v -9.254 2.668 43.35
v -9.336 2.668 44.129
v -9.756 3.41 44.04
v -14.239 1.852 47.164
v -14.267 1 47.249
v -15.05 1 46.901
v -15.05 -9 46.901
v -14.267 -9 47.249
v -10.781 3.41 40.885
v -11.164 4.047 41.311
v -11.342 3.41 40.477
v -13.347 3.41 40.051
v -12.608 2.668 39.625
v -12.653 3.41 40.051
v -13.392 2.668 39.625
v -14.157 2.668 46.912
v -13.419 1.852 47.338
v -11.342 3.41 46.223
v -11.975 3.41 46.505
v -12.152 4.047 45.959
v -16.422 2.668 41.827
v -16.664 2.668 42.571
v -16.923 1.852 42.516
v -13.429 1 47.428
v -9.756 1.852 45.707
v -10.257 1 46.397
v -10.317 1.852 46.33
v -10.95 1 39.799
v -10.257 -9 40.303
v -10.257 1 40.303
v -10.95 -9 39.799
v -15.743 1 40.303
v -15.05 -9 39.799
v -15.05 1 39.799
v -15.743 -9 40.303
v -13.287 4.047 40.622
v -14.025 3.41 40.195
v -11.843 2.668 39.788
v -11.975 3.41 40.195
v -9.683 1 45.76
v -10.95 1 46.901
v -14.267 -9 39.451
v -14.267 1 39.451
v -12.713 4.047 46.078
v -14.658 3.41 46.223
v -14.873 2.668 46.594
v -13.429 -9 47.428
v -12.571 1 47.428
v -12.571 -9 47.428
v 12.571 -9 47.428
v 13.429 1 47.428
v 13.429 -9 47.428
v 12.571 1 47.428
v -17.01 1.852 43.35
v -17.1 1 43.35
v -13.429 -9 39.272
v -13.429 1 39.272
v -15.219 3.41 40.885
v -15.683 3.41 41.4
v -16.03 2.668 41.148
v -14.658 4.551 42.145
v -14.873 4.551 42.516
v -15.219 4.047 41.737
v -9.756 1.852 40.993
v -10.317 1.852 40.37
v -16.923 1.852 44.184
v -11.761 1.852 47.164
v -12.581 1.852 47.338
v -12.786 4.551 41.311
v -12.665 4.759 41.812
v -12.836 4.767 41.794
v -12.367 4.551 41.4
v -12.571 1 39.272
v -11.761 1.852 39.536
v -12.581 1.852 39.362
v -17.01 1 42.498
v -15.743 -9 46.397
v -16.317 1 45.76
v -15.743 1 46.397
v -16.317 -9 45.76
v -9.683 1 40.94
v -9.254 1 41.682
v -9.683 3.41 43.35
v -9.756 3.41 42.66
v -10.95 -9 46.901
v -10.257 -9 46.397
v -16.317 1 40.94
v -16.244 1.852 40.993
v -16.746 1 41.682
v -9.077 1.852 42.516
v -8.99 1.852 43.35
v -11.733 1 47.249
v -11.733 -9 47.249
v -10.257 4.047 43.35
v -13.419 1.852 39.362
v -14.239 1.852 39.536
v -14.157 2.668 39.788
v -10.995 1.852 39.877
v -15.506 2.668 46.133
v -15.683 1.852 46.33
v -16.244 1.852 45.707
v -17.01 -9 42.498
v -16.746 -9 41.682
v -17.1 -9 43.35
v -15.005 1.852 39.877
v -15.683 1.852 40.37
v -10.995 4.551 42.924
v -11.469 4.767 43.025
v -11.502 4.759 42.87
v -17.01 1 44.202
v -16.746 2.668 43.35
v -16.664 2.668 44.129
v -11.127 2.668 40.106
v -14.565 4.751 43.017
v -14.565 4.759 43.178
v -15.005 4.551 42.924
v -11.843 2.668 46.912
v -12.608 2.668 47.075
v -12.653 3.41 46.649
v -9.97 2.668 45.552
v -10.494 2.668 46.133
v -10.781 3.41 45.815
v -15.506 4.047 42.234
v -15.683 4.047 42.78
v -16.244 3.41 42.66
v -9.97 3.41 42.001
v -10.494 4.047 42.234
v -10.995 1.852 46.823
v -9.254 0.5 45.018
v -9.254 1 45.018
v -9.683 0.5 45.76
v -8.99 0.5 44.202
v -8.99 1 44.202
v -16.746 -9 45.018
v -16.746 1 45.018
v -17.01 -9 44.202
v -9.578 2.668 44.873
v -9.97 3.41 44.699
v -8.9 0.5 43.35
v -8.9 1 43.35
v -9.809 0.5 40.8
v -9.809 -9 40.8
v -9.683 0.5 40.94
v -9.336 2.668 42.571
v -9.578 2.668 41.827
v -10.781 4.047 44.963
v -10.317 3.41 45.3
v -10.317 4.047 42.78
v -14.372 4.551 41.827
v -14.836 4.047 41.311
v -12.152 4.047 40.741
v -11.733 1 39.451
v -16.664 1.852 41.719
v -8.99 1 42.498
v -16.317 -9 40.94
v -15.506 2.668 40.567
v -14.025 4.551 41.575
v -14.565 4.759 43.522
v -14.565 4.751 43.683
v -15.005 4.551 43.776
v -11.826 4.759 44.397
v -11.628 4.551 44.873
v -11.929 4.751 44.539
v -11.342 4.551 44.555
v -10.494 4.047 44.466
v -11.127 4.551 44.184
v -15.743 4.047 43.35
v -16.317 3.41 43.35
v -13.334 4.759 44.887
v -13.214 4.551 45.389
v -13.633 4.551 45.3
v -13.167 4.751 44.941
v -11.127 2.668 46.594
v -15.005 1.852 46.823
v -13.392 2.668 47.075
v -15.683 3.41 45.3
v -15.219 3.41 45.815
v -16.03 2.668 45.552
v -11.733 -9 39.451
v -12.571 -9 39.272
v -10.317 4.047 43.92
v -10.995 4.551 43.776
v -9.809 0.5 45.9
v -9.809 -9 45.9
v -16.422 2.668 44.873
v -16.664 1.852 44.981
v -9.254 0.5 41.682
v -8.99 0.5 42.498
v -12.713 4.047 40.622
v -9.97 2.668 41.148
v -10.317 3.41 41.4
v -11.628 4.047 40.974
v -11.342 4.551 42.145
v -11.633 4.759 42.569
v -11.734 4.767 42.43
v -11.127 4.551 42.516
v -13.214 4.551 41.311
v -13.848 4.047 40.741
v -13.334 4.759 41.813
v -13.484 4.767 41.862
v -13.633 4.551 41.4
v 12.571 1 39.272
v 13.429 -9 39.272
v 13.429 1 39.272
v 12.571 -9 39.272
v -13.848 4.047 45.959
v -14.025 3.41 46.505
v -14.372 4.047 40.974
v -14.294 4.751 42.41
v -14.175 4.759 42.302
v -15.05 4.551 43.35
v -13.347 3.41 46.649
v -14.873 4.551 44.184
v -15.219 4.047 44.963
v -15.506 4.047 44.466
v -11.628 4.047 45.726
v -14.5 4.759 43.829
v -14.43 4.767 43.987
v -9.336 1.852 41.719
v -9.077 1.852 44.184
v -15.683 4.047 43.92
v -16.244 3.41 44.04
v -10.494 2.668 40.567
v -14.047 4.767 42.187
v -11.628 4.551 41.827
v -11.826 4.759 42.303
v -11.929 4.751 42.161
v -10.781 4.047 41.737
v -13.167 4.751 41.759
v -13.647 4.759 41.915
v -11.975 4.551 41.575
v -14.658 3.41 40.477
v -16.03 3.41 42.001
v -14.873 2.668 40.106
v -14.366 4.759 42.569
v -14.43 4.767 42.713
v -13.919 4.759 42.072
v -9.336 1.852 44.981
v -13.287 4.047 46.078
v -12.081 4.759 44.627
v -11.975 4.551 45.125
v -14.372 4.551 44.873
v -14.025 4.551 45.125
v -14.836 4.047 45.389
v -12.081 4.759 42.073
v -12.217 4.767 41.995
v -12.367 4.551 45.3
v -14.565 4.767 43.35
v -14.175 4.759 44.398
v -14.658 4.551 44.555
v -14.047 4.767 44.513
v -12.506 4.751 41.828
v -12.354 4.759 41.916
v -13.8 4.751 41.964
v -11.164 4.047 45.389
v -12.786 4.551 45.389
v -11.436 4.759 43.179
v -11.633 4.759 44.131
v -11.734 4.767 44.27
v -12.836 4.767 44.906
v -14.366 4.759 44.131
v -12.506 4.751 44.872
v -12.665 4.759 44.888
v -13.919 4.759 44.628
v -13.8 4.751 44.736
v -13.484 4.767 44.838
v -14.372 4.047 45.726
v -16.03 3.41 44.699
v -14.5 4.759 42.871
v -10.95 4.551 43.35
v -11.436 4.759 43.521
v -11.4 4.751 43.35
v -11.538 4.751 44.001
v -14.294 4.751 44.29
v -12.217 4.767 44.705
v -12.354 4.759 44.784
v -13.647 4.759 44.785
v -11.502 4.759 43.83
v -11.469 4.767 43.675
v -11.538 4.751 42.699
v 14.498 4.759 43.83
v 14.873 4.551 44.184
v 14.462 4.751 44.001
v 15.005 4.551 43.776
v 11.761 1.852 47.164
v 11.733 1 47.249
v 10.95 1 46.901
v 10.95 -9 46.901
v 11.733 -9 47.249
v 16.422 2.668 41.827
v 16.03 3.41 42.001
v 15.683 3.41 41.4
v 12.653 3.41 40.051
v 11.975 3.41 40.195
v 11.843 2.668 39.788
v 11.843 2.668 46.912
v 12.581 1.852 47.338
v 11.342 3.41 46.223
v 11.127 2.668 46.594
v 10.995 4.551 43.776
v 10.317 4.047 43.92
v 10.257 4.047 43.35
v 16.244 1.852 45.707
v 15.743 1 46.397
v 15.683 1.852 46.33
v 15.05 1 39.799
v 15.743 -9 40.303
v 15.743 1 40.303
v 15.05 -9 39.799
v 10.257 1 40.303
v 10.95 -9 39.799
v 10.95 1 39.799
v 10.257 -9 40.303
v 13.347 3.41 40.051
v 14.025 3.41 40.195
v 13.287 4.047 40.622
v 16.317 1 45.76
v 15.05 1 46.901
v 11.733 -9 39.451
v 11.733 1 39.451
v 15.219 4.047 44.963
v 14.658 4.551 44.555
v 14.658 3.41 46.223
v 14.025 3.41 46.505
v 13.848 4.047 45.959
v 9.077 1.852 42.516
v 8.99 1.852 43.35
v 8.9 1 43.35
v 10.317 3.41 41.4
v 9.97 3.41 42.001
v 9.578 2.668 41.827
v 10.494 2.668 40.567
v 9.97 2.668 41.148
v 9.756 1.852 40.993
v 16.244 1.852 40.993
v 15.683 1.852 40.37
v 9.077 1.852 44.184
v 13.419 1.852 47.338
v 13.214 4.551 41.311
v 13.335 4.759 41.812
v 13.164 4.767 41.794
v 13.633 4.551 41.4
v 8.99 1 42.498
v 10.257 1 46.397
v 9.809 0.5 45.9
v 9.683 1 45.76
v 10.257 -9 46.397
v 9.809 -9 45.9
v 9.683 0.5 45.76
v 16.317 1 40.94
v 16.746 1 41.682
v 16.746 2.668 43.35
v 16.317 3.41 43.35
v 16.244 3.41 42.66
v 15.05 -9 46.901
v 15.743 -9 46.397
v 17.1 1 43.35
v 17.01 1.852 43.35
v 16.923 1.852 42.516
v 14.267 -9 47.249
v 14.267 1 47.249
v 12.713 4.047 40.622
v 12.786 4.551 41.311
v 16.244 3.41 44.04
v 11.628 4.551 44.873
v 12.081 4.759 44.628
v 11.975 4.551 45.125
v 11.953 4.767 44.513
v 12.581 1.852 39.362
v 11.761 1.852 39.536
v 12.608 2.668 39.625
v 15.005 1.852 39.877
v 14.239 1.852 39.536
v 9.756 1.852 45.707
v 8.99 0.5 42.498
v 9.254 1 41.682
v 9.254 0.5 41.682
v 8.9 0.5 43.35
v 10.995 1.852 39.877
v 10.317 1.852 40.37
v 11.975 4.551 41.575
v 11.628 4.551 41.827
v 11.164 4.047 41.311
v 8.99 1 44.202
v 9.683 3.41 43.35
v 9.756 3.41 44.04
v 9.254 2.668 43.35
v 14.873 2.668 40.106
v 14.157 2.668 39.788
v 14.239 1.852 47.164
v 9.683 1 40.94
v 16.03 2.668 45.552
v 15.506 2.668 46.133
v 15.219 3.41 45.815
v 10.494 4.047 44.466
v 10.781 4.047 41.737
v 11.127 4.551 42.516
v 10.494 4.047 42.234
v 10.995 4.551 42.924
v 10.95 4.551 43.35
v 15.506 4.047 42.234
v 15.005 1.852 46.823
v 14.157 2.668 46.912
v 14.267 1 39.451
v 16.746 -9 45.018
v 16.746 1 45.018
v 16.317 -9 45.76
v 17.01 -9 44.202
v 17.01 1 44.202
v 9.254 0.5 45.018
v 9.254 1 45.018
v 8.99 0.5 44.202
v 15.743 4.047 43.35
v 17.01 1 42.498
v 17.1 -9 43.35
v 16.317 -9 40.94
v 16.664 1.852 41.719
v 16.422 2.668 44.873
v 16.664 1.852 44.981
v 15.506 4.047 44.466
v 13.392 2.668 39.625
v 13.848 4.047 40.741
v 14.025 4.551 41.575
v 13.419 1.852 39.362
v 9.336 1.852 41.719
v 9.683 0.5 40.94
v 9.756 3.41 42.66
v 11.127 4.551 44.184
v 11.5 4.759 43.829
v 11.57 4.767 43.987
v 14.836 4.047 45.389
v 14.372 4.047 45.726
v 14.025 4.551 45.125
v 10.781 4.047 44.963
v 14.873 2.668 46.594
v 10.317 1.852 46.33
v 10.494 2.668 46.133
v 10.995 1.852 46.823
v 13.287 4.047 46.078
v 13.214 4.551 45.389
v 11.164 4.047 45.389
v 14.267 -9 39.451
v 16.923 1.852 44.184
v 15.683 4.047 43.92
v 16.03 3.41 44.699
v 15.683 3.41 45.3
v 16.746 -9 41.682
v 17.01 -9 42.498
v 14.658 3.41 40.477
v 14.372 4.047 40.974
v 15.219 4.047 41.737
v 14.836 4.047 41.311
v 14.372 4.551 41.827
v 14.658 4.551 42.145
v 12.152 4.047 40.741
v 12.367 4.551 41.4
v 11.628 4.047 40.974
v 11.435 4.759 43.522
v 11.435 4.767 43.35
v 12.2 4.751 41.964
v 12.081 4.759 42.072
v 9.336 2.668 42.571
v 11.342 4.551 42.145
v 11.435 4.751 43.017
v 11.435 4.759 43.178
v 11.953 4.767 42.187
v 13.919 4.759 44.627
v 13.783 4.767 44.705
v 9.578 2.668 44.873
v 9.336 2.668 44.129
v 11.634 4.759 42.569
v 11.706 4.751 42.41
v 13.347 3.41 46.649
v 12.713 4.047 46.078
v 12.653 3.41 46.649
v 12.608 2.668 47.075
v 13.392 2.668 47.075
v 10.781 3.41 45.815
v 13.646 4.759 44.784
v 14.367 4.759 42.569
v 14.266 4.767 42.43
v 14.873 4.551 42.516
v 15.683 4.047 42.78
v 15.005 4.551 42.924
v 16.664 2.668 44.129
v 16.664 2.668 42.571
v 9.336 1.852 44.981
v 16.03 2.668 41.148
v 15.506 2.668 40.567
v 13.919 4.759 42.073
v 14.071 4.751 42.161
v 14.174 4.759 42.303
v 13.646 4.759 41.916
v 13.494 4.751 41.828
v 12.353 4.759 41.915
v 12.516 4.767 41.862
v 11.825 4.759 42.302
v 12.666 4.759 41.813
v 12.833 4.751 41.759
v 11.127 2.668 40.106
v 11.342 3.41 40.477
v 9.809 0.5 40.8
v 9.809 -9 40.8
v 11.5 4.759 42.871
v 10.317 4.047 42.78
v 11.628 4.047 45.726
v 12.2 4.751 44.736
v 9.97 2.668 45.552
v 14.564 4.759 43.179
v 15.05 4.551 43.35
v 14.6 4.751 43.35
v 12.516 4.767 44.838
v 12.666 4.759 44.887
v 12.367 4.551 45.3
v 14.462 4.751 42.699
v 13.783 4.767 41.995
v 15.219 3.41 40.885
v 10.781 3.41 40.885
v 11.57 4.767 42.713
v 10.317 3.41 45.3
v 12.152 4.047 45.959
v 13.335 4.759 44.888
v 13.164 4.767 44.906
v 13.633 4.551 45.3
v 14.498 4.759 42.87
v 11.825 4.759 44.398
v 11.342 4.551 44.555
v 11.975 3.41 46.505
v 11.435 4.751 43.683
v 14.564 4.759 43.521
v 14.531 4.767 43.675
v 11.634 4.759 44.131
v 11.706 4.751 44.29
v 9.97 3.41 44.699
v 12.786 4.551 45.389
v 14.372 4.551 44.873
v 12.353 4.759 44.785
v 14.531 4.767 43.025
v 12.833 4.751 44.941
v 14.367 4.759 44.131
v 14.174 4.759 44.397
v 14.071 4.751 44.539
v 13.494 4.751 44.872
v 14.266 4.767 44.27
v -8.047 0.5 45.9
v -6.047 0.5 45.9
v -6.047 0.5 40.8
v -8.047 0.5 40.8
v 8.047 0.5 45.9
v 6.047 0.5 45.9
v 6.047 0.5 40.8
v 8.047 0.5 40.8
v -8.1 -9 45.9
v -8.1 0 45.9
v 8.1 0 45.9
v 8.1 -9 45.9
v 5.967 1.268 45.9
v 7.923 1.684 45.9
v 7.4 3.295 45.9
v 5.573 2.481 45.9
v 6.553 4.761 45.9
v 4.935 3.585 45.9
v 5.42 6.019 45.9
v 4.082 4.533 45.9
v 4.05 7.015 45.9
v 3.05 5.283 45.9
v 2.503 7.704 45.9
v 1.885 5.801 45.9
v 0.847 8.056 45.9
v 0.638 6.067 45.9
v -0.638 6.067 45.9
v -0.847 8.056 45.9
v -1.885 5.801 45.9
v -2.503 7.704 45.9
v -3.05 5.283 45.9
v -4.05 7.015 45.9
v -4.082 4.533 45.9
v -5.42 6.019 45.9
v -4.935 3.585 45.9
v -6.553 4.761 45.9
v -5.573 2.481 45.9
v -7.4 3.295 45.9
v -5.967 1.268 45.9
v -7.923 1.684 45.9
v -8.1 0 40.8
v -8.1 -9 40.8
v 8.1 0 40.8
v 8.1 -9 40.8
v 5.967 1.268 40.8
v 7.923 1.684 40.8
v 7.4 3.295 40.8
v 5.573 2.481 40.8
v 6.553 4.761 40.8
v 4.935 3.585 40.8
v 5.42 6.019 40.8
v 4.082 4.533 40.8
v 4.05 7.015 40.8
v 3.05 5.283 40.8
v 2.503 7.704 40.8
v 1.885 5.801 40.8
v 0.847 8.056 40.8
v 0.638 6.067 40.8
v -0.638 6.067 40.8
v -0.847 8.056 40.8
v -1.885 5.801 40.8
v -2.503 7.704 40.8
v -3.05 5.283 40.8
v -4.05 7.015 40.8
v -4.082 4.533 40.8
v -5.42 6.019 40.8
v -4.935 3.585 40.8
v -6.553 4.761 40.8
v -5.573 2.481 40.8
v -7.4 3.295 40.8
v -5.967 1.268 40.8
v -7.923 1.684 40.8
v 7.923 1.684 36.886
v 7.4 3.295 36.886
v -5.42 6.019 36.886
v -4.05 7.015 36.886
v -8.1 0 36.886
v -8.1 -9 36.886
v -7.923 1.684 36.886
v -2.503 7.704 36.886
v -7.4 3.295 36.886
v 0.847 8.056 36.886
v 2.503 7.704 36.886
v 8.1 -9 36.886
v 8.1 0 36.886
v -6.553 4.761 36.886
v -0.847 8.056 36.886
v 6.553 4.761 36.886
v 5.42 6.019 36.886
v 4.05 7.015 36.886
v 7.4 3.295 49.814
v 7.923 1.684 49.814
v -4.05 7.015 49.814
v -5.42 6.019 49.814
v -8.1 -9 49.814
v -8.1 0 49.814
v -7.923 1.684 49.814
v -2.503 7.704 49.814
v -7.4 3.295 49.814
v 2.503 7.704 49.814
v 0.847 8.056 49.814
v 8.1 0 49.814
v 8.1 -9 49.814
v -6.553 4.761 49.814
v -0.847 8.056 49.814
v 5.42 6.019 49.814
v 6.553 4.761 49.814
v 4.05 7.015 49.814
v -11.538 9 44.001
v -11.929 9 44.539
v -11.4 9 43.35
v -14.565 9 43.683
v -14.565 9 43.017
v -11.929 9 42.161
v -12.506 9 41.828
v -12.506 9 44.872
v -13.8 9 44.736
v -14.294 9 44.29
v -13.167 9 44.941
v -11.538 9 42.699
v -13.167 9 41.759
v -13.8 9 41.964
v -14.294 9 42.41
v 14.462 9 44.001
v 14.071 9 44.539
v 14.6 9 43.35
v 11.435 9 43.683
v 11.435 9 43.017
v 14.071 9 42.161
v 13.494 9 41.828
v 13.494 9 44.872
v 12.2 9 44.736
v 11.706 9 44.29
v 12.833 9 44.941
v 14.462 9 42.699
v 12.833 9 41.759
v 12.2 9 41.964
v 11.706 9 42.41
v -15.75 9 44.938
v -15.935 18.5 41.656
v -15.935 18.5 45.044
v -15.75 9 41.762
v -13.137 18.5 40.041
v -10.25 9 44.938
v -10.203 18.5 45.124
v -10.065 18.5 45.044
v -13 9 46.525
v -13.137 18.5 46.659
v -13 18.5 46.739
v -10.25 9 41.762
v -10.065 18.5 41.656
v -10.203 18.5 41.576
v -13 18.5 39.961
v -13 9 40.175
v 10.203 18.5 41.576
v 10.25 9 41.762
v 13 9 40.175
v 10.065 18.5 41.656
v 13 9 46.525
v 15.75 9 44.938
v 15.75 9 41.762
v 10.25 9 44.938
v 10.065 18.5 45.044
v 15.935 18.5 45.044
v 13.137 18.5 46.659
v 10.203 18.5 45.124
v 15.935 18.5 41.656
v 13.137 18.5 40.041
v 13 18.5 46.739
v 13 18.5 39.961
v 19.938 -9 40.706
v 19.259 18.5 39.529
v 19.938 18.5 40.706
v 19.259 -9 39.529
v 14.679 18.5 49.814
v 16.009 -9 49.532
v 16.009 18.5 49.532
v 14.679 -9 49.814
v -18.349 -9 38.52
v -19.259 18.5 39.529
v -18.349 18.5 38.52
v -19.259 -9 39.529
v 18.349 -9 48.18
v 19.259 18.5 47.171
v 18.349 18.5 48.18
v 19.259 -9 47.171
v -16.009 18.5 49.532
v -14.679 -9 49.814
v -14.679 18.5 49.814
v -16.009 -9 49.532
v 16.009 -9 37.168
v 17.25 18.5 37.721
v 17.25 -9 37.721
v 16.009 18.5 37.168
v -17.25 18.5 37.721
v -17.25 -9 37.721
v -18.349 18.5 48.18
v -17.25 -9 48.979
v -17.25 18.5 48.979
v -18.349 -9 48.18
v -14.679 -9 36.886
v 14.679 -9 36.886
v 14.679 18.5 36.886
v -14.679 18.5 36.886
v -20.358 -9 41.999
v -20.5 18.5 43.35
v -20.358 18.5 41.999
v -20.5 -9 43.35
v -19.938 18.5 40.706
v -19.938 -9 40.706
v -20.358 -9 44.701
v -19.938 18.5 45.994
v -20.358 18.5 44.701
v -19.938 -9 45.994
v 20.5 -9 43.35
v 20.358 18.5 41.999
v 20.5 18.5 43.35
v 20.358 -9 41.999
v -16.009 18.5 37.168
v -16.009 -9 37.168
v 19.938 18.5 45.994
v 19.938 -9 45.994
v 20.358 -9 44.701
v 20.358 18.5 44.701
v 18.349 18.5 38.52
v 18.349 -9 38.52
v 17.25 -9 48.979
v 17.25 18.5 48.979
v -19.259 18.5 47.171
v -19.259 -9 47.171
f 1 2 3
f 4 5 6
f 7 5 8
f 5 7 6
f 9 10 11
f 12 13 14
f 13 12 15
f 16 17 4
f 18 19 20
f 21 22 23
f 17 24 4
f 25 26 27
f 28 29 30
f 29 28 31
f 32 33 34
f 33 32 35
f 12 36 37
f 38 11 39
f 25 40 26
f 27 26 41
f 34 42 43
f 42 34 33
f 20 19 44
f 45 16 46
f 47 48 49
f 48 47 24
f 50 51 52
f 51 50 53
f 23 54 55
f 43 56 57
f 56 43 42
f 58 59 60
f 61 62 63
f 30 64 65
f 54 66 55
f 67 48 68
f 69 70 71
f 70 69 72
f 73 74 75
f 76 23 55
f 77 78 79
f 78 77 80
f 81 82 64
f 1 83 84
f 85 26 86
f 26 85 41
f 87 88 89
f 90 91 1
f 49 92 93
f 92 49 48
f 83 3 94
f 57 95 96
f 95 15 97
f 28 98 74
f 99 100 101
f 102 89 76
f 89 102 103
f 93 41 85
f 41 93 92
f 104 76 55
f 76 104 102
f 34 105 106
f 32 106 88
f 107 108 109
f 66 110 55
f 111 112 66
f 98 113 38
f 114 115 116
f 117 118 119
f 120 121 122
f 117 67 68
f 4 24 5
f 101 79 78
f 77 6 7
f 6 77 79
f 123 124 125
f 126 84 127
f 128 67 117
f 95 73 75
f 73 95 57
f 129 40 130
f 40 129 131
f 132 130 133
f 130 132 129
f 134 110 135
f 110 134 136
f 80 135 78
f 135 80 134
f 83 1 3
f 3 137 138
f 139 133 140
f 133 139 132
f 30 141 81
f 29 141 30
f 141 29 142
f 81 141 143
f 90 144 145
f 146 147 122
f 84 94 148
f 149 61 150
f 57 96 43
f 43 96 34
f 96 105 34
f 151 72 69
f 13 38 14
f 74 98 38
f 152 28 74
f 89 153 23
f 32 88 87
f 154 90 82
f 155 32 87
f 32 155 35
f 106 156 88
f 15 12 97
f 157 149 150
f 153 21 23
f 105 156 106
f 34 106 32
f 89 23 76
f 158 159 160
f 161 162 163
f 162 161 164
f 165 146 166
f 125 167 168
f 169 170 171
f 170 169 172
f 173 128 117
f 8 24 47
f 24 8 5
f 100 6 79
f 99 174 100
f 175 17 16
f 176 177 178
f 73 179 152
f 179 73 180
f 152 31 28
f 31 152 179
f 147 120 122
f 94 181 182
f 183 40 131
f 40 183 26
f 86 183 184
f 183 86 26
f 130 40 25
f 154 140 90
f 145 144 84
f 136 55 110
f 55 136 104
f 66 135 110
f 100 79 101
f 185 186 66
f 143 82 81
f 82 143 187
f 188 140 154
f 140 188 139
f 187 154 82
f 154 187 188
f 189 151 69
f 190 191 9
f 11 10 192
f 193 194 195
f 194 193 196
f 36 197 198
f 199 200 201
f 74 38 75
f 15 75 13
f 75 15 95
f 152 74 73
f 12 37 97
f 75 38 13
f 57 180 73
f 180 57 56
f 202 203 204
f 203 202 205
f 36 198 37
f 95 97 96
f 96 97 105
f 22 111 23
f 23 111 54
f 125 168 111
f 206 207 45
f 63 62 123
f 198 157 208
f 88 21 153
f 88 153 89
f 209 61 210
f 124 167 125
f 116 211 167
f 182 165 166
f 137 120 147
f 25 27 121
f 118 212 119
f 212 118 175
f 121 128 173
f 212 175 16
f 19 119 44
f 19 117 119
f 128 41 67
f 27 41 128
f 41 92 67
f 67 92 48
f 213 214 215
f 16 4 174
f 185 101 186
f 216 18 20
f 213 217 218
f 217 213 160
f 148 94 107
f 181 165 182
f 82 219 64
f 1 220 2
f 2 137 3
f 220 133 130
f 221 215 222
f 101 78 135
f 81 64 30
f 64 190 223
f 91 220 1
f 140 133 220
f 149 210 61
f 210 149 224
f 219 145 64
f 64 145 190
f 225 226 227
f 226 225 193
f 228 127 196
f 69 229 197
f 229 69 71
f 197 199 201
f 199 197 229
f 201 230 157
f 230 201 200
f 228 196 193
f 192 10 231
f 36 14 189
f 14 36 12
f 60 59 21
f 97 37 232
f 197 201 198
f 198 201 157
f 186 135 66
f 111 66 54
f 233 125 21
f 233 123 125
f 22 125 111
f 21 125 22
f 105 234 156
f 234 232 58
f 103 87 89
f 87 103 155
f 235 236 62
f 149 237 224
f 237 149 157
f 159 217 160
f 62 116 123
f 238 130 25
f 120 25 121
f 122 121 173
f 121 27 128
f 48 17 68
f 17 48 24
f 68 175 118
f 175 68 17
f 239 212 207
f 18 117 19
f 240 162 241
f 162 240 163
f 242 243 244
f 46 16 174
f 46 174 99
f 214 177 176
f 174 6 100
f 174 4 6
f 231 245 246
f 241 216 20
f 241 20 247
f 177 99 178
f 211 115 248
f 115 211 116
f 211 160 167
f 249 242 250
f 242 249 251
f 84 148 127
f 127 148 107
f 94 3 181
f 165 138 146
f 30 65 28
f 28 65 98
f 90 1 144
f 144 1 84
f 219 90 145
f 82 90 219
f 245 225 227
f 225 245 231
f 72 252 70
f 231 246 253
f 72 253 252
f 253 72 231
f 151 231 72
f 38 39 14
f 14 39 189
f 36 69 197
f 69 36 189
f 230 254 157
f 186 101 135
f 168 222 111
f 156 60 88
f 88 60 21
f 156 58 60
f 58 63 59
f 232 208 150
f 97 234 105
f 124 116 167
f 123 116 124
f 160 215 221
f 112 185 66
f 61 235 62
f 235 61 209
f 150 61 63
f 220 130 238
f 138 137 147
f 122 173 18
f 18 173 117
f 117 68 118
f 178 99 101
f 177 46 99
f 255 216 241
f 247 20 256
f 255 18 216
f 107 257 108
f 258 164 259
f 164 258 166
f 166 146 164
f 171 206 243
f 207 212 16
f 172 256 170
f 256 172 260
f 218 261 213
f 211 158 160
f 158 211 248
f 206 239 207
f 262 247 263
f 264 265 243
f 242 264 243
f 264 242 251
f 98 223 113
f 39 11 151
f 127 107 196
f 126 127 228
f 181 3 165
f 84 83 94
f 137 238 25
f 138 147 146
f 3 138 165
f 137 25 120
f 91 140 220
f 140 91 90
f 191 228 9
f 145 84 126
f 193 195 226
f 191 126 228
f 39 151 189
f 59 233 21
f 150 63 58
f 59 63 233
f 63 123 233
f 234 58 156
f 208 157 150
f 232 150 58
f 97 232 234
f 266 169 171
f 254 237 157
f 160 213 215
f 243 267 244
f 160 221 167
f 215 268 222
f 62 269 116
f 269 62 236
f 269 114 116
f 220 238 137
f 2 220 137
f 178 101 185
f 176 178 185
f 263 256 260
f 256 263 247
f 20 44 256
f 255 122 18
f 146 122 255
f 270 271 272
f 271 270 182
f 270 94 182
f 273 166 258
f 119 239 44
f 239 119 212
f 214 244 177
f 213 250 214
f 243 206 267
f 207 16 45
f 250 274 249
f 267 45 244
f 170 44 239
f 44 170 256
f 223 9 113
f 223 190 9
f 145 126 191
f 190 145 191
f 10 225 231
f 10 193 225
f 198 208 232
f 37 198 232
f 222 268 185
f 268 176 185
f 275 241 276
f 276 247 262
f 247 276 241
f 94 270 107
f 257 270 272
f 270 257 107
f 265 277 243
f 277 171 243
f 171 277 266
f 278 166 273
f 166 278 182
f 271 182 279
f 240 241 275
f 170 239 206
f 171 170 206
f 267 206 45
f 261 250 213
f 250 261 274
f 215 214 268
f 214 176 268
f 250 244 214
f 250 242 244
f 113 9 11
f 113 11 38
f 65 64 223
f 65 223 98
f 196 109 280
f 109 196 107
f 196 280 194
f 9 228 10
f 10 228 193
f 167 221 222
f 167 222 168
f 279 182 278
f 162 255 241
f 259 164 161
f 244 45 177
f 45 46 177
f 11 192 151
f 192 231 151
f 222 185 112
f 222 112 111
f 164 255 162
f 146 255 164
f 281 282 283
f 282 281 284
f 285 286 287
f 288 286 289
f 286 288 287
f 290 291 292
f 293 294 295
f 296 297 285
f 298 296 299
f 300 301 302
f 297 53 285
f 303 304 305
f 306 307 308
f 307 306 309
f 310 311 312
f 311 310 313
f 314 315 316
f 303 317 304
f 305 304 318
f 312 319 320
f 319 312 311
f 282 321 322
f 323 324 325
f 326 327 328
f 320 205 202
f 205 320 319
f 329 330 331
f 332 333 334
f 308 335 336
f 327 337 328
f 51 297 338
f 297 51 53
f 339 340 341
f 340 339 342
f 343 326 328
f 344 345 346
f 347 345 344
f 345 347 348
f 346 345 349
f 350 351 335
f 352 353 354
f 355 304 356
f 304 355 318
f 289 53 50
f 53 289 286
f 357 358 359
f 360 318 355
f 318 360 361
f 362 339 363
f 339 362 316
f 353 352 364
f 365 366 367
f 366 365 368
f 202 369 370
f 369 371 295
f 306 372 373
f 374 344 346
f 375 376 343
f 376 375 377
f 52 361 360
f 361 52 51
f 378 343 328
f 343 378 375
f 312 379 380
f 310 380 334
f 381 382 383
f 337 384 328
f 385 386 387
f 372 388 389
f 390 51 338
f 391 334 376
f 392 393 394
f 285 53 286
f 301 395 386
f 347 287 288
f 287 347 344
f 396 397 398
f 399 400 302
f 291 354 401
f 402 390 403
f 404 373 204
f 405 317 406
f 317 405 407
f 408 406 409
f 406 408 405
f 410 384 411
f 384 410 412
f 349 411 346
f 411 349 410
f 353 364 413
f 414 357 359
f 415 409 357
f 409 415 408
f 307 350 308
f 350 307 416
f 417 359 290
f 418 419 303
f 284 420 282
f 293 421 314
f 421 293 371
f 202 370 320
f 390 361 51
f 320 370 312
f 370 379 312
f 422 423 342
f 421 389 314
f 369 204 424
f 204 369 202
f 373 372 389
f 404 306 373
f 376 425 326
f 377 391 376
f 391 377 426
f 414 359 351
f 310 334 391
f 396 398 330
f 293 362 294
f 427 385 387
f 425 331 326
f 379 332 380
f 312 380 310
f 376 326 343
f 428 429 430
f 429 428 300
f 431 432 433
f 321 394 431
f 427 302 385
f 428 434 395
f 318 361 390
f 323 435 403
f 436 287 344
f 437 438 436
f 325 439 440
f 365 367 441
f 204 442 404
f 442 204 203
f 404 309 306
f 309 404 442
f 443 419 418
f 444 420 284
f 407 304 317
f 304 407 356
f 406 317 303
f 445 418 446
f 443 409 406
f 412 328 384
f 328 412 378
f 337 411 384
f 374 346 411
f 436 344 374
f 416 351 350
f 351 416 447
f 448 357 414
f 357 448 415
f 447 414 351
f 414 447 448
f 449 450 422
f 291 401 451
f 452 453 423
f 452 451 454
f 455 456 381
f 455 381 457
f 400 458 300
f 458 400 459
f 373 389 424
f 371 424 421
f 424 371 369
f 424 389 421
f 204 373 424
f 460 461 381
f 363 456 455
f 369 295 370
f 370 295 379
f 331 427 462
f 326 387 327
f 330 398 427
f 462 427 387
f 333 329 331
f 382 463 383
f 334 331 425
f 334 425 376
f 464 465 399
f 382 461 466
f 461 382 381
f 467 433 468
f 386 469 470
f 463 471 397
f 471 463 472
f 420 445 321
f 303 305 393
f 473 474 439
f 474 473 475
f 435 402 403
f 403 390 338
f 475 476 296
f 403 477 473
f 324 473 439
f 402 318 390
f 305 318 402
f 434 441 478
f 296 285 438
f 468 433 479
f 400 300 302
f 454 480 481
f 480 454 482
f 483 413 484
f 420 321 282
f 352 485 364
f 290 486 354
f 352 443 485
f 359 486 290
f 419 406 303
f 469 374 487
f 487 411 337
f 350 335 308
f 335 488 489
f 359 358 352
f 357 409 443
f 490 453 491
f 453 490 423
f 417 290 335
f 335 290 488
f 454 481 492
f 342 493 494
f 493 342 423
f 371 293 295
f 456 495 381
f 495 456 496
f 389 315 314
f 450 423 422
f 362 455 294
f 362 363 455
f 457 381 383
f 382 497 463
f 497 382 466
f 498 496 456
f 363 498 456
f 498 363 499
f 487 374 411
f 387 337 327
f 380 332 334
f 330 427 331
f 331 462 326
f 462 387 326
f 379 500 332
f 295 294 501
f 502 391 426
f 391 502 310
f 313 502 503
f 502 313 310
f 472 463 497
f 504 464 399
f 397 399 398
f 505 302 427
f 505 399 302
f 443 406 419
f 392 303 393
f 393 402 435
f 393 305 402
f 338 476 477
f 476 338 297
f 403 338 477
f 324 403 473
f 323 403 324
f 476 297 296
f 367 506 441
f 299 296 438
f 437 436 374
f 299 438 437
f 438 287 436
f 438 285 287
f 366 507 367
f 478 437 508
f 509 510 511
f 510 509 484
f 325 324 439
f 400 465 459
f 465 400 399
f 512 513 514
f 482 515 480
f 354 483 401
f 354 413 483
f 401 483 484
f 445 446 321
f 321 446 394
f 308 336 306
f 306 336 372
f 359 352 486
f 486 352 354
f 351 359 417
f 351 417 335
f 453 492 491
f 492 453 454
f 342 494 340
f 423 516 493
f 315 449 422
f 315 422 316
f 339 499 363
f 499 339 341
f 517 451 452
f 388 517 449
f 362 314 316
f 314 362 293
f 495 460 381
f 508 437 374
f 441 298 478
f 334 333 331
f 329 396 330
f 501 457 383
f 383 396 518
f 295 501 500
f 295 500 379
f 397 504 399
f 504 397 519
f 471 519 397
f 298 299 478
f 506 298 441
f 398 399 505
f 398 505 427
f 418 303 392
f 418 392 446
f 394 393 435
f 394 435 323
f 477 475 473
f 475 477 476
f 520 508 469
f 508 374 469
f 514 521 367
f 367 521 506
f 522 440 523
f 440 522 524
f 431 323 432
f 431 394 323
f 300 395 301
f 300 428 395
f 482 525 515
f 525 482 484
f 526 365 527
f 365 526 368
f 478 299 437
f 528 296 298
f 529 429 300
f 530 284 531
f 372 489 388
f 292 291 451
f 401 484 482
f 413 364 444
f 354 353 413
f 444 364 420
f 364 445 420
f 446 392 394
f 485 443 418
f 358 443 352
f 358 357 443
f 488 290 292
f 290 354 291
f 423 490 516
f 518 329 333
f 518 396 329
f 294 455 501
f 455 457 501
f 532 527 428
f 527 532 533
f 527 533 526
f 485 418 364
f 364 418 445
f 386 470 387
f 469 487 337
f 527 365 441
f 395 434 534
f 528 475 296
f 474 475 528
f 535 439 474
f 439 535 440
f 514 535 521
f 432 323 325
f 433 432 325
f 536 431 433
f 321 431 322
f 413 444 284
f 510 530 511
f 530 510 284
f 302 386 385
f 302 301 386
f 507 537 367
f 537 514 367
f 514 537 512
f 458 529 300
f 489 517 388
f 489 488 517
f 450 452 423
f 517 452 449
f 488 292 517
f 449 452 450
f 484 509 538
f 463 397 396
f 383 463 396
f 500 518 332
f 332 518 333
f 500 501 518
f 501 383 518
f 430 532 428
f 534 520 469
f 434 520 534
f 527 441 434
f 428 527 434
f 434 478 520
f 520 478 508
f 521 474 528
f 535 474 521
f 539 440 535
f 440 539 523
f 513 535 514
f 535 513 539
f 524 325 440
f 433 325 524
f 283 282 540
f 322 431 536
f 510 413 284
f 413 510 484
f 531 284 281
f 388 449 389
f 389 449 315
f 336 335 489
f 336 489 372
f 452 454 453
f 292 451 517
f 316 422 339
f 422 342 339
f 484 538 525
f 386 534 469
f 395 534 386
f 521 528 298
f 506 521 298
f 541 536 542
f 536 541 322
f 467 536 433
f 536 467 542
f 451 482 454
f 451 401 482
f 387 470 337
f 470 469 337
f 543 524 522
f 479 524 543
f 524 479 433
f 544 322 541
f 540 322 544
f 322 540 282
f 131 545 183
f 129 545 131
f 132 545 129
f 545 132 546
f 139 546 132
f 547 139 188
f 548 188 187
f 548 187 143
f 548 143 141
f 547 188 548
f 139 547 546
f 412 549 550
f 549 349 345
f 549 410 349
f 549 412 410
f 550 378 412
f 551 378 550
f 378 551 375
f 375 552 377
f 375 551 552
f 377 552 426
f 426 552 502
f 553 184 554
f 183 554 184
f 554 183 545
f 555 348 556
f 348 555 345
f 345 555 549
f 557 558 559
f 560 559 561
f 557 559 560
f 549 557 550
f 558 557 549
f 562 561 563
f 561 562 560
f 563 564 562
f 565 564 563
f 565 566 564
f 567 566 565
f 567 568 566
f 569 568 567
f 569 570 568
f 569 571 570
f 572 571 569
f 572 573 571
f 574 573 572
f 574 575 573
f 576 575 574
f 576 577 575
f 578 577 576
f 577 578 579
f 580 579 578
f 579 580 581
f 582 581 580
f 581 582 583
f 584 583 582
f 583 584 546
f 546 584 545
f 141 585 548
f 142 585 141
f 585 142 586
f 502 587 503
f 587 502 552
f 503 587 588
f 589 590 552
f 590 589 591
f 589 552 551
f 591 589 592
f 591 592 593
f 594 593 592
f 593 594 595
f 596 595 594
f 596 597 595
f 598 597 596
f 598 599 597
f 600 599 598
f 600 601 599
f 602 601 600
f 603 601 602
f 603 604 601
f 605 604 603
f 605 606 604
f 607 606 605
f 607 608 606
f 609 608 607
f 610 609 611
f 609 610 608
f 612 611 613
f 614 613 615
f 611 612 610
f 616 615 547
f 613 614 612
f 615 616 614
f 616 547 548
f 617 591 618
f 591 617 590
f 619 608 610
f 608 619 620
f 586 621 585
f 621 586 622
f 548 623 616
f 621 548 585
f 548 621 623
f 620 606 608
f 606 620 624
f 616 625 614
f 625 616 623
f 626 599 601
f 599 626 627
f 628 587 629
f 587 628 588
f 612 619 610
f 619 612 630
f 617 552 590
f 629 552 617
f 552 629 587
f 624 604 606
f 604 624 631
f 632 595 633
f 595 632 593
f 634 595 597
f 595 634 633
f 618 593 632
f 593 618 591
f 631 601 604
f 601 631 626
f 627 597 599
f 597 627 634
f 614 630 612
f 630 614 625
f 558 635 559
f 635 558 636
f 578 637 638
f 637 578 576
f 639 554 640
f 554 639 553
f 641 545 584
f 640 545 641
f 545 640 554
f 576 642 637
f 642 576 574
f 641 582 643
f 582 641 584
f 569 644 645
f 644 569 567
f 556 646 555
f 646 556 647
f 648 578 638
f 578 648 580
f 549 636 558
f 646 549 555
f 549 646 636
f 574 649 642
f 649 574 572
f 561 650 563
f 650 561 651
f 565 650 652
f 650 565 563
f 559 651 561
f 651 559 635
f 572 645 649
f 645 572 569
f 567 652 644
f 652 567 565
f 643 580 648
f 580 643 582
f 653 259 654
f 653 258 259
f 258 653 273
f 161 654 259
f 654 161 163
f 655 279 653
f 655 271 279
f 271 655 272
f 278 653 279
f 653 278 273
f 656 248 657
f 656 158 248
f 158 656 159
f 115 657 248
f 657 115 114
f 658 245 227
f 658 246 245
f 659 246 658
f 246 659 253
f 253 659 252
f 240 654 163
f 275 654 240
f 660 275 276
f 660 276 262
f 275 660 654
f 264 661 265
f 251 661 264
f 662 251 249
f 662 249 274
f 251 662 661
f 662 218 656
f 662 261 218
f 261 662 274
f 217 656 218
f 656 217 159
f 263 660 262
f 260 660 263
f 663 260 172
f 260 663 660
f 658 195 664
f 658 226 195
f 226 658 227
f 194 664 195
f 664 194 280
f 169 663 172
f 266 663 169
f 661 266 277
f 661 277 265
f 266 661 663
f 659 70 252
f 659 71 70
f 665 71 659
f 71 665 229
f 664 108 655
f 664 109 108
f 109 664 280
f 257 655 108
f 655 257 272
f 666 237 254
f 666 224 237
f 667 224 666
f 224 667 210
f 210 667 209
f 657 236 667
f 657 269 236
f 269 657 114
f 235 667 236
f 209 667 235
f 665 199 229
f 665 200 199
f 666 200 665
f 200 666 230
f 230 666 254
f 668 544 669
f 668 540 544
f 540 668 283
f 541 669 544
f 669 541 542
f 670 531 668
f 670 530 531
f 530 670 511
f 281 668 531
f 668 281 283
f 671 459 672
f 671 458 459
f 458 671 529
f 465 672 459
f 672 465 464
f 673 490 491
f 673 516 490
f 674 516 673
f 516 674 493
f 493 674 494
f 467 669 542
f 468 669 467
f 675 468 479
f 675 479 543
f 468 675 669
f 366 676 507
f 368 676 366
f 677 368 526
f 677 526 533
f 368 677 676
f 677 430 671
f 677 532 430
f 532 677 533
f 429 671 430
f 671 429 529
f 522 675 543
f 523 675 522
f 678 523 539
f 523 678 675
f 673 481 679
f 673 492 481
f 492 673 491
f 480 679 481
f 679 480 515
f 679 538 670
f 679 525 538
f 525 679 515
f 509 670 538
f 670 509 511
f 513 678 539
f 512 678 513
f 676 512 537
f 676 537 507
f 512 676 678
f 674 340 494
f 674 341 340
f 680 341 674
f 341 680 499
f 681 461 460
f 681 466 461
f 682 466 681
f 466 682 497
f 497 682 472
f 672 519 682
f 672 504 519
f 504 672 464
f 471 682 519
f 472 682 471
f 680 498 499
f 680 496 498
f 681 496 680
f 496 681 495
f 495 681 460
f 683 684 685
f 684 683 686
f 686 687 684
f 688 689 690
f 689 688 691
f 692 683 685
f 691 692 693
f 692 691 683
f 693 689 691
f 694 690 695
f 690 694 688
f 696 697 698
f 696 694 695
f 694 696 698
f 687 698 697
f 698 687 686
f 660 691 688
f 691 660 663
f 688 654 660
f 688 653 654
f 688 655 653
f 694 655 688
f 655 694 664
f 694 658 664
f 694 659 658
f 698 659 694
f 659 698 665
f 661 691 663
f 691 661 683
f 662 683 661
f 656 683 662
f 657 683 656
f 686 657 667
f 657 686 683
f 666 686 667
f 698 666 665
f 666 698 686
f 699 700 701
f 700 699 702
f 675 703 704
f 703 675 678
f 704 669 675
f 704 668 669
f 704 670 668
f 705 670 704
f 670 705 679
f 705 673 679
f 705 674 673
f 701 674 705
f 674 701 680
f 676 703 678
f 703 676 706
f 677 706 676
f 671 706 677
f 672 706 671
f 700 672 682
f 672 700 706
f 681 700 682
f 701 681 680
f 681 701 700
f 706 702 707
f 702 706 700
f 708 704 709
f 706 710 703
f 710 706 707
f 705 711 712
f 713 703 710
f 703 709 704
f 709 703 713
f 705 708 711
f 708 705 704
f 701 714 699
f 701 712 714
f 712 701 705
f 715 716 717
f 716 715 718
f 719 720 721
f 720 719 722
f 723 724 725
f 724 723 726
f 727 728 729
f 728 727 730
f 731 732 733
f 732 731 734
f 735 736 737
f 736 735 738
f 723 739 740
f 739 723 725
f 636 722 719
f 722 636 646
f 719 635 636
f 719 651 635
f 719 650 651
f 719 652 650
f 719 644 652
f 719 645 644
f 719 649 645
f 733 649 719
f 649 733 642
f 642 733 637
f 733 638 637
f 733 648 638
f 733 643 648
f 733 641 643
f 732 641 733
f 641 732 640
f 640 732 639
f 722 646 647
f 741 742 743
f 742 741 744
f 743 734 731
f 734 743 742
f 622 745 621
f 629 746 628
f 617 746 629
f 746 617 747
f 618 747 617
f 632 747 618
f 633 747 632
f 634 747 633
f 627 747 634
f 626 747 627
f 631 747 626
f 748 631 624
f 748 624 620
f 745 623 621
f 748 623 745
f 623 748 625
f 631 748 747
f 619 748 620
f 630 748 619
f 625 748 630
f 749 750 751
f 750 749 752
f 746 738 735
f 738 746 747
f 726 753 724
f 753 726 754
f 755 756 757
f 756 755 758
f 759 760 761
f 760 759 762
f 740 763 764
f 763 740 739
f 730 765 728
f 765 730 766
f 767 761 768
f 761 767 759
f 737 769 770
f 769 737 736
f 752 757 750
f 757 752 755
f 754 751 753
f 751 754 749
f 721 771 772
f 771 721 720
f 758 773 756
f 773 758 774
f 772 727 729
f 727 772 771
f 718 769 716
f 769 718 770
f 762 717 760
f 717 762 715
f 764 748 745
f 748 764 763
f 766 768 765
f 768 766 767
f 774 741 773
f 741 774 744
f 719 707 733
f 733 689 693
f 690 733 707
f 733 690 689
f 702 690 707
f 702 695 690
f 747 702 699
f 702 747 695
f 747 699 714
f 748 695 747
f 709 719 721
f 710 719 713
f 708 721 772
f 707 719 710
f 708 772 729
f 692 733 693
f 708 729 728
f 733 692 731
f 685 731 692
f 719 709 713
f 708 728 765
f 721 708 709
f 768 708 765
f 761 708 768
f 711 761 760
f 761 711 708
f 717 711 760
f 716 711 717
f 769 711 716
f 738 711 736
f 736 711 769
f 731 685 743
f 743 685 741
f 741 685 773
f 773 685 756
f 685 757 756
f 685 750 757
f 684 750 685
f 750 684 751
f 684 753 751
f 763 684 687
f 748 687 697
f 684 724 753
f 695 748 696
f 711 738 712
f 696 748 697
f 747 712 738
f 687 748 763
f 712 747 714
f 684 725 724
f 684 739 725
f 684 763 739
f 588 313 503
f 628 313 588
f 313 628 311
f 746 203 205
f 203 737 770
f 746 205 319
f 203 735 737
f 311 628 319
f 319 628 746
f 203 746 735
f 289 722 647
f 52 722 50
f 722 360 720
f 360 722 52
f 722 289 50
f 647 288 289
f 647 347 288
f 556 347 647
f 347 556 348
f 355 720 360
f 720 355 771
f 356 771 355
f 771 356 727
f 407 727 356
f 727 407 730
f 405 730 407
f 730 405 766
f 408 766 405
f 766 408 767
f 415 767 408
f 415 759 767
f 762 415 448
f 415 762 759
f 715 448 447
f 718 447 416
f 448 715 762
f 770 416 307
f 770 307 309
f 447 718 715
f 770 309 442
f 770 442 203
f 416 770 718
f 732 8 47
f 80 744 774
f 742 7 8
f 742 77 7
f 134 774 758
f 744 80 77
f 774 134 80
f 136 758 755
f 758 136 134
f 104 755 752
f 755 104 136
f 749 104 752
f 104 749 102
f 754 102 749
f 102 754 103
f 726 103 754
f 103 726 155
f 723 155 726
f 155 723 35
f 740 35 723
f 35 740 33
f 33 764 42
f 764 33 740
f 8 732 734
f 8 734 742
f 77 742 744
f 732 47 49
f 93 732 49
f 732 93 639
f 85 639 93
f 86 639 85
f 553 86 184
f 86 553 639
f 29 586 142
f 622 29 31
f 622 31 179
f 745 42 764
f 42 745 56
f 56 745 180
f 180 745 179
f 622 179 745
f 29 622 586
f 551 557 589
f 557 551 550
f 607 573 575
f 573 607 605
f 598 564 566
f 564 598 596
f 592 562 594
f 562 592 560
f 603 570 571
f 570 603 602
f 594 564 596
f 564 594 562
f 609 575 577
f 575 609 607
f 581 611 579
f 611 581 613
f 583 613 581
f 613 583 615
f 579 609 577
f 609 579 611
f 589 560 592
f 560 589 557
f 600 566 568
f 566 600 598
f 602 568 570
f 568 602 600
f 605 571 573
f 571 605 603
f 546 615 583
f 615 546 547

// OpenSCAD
// somewhat large hot-end I happen to have
RES=30;  // higher for production render

Hbody = 50;  // height of aluminum base
Dbody = 25;  // diameter at outside of cooling fins
Gblock = 3.7; // gap from body to top of block
IDmount = 12; // inner diameter of mount groove
ODmount = 16; // outer diameter of mount groove
WtopFlange = 4;
Wmount = 5.3;
WbotFlange = 3;

Hblock=12.1; // height of heat block
Wblock = 16; // width of heat block, heater parallel to W axis
Dblock = 16; // nozzle NOT centered in +-D direction

DsocketHeadM3 = 5.4;
HsocketHeadM3 = 3;

%hotEnd();

%translate([0,20,43.35])
rotate([0,90,-90])  // let face of carriage be y=0
railMGN7H();

//difference() { union() {
translate([0,0,Hbody-WtopFlange-Wmount/2])
%retentionTab();

translate([0,0,Hbody-WtopFlange-Wmount/2])
hotEndMount(false,false);
//} translate([0,0,53]) cube([80,80,20],center=true);}

WmountBrace=14;
module hotEndMount(withBrace=true, carriageBase=true) difference() {
    union() {
        *translate([0,9,0]) rotate([90,0,0]) hull() pairX(WmountBrace) 
            cylinder(r=6.5,h=1,$fn=RES);
        baseLen = carriageBase ? 0 : 8.5;
        translate([0,10+baseLen,0]) rotate([90,0,0]) hull() pairX(WmountBrace) 
            cylinder(r=6.5,h=19+baseLen,$fn=RES);
        if (carriageBase) translate([0,20,0]) hull() {
            pairX(6) pairZ(13) rotate([90,0,0])
                cylinder(r=2,h=1,$fn=RES/2);
            translate([0,-11,0]) pairX(WmountBrace) rotate([90,0,0])
                cylinder(r=6.5,h=1,$fn=RES);
        }
        
        // cut away from this sheath over the hot-end as little
        // as possible, for strength
        if (withBrace) braceSheath();
    }
    
    translate([0,1,0]) retentionTabBase(.1);
    hull() {
        cylinder(d=IDmount+.2,h=Wmount+.2,center=true,$fn=RES);
        translate([0,-20,0]) cube([IDmount+.2,1,Wmount+.2],center=true);
    }

    cylinder(d=IDmount,h=20,center=true,$fn=RES);
    pairZ(Wmount/2-.1 +4/2) hull() {
        cylinder(d=ODmount+.2,h=4,center=true,$fn=RES);
        translate([0,-10,0]) cube([ODmount+.2,1,4],center=true);
    }

    // I think the taps on MGN7 carriage are only about 3mm deep
    //   plan on M2 screw to go only 2mm below face of carriage
    if(withBrace)
    translate([0,20.1,0]) rotate([90,0,0]) pairX(6) pairY(6.5) {
        cylinder(r=1.05,h=20,$fn=RES/3);  // M2 socket head? 8mm
        translate([0,0,8-2]) cylinder(d1=3.8,d2=4.2,h=13.5,$fn=RES/2);
    }
    
    translate([0,18,0]) pairX(13) rotate([90,0,0]) cylinder(r=1.6,h=14,$fn=RES/2);
    translate([0,19,0]) pairX(13) rotate([90,30,0])  // M3 nut hole 
       cylinder(d1=6.8, d2=5.5/cos(30),h=10,$fn=6);
    
    translate([-25,20,-51]) cube([50,16,80]);    // don't overlap carriage
    
    translate([0,0,-11]) {   // clearance from hot end
        translate([0,0,-34])
        cylinder(d=Dbody+6, h=34.1,$fn=RES);
        cylinder(d1=Dbody+6, d2=Dbody-3,h=4,$fn=RES);
    
        // clearance from block
        translate([0,-3,-40]) cube([26,24,16],center=true);
    }
}

module braceSheath() difference() {
    hull() {
        cube([36,18,3.5],center=true);

        difference() {
            translate([0,0,-40])
                cylinder(r=24, h=30, $fn=RES*1.5);

            translate([-25,-28,-51]) cube([50,50,18]);
            translate([-25,20,-60]) cube([50,20,80]);

            // don't interfere with blowers
            hull() {
                translate([-25,-29,-5.4])   cube([50,20,1]);
                translate([-25,-28,-40]) cube([50,50,1]);
                //#translate([0,6,-25]) rotate([0,90,0])
                //    cylinder(r=6,h=60,center=true,$fn=RES/2);
            }
        }            
        
    }

    translate([0,0,-51]) cylinder(d=Dbody+12, h=44.55, $fn=RES*1.5);

    
}

module retentionTabBase(fuzz=0) {
    difference() {
        union() {
            hull() {
                translate([0,-5.5,0])
                    cube([ODmount+fuzz-.1,ODmount/2+2,Wmount+4-.2],center=true);
                translate([0,-15,0]) cube([ODmount-1,1,Wmount+2],center=true);
            }
            translate([0,-5.5,0])
            cube([ODmount+6,ODmount/2+2,Wmount-.2],center=true);
            rotate([90,0,0]) pairX(13) hull() {
                sphere(r=4+fuzz,$fn=RES);
                translate([0,0,8+2]) cylinder(r=4+fuzz,h=1,$fn=RES);
            }
            rotate([90,0,0]) hull() pairX(13)
                translate([0,0,8.5+2]) cylinder(r=4+fuzz,h=6,$fn=RES);
            
        }
        
        cylinder(d=IDmount-fuzz,h=Wmount+1,center=true,$fn=RES);
        //*pairX(13) rotate([90,0,0]) {
        //    cylinder(r=1.5,h=40,center=true,$fn=RES/2);
        //    translate([0,0,15]) cylinder(d1=DsocketHeadM3, d2=DsocketHeadM3+.2,
        //        h=HsocketHeadM3+1, $fn=RES/2);
        //}
        pairZ(Wmount/2+1+2*fuzz) cylinder(d=ODmount+2*fuzz,h=2,center=true,$fn=RES);
        
        //%cylinder(d=ODmount,h=1,center=true,$fn=RES);
    }
}

//just add screw holes, for re-use in hotEndMount()
module retentionTab(fuzz=0) difference() { retentionTabBase(fuzz);
    pairX(13) rotate([90,0,0]) {
            cylinder(r=1.5,h=40,center=true,$fn=RES/2);
            translate([0,0,13]) cylinder(d1=DsocketHeadM3, d2=DsocketHeadM3+.2,
                h=HsocketHeadM3+1, $fn=RES/2);
    }
}

module railMGN7H(len=50,pos=0) {
    // H=8 H1=1.5
    // total assembly thickness H=8
    // bot of rail to bot of carriage, H1=1.5
    // width of rail, Wr=7
    // height of rail, HR=4.8
    // width of carriage W=17
    // bolts on center, perp to motion B=12
    // length of carriage, L=30.8
    // bold spacing, parallel to motion, C=13
    // dist bet. rail holes on center , P=15
    // hole diam d=2.4
    // head diam D=4.2
    // head depth, h=2.3
    
    //put face of carriage at Y=0
    color("silver")
    translate([0,0,-8+2.4]) rail7(len);
    translate([-pos,0,0]) MGN7H();
}
module MGN7H() translate([0,0,(1.5-8)/2])
    difference() { cube([30.8,17,8-1.5],center=true);
        #pairX(13/2) pairY(6)
            cylinder(r=1,h=5,$fn=16);
    }


module rail7(len=50) difference() { cube([len,7,4.8],center=true);
    for(k=[0:15:len/2]) pairX(k) {
        cylinder(d=2.4,h=22,$fn=16,center=true);
        translate([0,0,(4.8/2)-2.3]) cylinder(d=4.2,h=3,$fn=16);
    }
}

module pairX(d) for(a=[-d,d]) translate([a,0,0]) children();
module pairY(d) for(a=[-d,d]) translate([0,a,0]) children();
module pairZ(d) for(a=[-d,d]) translate([0,0,a]) children();
    
module hotEnd() {
    hotBlock();
    cylinder(d=Dbody,h=32,$fn=36);  // cooler setion of body
    cylinder(d=IDmount,h=Hbody,$fn=24);
    translate([0,0,38]) {  // mount flanges
        translate([0,0,WbotFlange+Wmount])
            cylinder(d=ODmount,h=WtopFlange,$fn=24);
            cylinder(d=ODmount,h=WbotFlange,$fn=24);
    }
}
    
module hotBlock() { // nozzle and mount on Z axis
    translate([0,-3,-Hblock/2-Gblock])  // offset from center of nozzle
        cube([Wblock, Dblock,Hblock],center=true);
    translate([0,0,-Hblock-5-Gblock]) cylinder(h=5,r2=3,r1=.3,$fn=6);  // nozzle
    translate([0,-6,-Gblock-6/2-2]) rotate([0,90,0])
        cylinder(d=6,h=Wblock+3,center=true, $fn=24); // heater
}
